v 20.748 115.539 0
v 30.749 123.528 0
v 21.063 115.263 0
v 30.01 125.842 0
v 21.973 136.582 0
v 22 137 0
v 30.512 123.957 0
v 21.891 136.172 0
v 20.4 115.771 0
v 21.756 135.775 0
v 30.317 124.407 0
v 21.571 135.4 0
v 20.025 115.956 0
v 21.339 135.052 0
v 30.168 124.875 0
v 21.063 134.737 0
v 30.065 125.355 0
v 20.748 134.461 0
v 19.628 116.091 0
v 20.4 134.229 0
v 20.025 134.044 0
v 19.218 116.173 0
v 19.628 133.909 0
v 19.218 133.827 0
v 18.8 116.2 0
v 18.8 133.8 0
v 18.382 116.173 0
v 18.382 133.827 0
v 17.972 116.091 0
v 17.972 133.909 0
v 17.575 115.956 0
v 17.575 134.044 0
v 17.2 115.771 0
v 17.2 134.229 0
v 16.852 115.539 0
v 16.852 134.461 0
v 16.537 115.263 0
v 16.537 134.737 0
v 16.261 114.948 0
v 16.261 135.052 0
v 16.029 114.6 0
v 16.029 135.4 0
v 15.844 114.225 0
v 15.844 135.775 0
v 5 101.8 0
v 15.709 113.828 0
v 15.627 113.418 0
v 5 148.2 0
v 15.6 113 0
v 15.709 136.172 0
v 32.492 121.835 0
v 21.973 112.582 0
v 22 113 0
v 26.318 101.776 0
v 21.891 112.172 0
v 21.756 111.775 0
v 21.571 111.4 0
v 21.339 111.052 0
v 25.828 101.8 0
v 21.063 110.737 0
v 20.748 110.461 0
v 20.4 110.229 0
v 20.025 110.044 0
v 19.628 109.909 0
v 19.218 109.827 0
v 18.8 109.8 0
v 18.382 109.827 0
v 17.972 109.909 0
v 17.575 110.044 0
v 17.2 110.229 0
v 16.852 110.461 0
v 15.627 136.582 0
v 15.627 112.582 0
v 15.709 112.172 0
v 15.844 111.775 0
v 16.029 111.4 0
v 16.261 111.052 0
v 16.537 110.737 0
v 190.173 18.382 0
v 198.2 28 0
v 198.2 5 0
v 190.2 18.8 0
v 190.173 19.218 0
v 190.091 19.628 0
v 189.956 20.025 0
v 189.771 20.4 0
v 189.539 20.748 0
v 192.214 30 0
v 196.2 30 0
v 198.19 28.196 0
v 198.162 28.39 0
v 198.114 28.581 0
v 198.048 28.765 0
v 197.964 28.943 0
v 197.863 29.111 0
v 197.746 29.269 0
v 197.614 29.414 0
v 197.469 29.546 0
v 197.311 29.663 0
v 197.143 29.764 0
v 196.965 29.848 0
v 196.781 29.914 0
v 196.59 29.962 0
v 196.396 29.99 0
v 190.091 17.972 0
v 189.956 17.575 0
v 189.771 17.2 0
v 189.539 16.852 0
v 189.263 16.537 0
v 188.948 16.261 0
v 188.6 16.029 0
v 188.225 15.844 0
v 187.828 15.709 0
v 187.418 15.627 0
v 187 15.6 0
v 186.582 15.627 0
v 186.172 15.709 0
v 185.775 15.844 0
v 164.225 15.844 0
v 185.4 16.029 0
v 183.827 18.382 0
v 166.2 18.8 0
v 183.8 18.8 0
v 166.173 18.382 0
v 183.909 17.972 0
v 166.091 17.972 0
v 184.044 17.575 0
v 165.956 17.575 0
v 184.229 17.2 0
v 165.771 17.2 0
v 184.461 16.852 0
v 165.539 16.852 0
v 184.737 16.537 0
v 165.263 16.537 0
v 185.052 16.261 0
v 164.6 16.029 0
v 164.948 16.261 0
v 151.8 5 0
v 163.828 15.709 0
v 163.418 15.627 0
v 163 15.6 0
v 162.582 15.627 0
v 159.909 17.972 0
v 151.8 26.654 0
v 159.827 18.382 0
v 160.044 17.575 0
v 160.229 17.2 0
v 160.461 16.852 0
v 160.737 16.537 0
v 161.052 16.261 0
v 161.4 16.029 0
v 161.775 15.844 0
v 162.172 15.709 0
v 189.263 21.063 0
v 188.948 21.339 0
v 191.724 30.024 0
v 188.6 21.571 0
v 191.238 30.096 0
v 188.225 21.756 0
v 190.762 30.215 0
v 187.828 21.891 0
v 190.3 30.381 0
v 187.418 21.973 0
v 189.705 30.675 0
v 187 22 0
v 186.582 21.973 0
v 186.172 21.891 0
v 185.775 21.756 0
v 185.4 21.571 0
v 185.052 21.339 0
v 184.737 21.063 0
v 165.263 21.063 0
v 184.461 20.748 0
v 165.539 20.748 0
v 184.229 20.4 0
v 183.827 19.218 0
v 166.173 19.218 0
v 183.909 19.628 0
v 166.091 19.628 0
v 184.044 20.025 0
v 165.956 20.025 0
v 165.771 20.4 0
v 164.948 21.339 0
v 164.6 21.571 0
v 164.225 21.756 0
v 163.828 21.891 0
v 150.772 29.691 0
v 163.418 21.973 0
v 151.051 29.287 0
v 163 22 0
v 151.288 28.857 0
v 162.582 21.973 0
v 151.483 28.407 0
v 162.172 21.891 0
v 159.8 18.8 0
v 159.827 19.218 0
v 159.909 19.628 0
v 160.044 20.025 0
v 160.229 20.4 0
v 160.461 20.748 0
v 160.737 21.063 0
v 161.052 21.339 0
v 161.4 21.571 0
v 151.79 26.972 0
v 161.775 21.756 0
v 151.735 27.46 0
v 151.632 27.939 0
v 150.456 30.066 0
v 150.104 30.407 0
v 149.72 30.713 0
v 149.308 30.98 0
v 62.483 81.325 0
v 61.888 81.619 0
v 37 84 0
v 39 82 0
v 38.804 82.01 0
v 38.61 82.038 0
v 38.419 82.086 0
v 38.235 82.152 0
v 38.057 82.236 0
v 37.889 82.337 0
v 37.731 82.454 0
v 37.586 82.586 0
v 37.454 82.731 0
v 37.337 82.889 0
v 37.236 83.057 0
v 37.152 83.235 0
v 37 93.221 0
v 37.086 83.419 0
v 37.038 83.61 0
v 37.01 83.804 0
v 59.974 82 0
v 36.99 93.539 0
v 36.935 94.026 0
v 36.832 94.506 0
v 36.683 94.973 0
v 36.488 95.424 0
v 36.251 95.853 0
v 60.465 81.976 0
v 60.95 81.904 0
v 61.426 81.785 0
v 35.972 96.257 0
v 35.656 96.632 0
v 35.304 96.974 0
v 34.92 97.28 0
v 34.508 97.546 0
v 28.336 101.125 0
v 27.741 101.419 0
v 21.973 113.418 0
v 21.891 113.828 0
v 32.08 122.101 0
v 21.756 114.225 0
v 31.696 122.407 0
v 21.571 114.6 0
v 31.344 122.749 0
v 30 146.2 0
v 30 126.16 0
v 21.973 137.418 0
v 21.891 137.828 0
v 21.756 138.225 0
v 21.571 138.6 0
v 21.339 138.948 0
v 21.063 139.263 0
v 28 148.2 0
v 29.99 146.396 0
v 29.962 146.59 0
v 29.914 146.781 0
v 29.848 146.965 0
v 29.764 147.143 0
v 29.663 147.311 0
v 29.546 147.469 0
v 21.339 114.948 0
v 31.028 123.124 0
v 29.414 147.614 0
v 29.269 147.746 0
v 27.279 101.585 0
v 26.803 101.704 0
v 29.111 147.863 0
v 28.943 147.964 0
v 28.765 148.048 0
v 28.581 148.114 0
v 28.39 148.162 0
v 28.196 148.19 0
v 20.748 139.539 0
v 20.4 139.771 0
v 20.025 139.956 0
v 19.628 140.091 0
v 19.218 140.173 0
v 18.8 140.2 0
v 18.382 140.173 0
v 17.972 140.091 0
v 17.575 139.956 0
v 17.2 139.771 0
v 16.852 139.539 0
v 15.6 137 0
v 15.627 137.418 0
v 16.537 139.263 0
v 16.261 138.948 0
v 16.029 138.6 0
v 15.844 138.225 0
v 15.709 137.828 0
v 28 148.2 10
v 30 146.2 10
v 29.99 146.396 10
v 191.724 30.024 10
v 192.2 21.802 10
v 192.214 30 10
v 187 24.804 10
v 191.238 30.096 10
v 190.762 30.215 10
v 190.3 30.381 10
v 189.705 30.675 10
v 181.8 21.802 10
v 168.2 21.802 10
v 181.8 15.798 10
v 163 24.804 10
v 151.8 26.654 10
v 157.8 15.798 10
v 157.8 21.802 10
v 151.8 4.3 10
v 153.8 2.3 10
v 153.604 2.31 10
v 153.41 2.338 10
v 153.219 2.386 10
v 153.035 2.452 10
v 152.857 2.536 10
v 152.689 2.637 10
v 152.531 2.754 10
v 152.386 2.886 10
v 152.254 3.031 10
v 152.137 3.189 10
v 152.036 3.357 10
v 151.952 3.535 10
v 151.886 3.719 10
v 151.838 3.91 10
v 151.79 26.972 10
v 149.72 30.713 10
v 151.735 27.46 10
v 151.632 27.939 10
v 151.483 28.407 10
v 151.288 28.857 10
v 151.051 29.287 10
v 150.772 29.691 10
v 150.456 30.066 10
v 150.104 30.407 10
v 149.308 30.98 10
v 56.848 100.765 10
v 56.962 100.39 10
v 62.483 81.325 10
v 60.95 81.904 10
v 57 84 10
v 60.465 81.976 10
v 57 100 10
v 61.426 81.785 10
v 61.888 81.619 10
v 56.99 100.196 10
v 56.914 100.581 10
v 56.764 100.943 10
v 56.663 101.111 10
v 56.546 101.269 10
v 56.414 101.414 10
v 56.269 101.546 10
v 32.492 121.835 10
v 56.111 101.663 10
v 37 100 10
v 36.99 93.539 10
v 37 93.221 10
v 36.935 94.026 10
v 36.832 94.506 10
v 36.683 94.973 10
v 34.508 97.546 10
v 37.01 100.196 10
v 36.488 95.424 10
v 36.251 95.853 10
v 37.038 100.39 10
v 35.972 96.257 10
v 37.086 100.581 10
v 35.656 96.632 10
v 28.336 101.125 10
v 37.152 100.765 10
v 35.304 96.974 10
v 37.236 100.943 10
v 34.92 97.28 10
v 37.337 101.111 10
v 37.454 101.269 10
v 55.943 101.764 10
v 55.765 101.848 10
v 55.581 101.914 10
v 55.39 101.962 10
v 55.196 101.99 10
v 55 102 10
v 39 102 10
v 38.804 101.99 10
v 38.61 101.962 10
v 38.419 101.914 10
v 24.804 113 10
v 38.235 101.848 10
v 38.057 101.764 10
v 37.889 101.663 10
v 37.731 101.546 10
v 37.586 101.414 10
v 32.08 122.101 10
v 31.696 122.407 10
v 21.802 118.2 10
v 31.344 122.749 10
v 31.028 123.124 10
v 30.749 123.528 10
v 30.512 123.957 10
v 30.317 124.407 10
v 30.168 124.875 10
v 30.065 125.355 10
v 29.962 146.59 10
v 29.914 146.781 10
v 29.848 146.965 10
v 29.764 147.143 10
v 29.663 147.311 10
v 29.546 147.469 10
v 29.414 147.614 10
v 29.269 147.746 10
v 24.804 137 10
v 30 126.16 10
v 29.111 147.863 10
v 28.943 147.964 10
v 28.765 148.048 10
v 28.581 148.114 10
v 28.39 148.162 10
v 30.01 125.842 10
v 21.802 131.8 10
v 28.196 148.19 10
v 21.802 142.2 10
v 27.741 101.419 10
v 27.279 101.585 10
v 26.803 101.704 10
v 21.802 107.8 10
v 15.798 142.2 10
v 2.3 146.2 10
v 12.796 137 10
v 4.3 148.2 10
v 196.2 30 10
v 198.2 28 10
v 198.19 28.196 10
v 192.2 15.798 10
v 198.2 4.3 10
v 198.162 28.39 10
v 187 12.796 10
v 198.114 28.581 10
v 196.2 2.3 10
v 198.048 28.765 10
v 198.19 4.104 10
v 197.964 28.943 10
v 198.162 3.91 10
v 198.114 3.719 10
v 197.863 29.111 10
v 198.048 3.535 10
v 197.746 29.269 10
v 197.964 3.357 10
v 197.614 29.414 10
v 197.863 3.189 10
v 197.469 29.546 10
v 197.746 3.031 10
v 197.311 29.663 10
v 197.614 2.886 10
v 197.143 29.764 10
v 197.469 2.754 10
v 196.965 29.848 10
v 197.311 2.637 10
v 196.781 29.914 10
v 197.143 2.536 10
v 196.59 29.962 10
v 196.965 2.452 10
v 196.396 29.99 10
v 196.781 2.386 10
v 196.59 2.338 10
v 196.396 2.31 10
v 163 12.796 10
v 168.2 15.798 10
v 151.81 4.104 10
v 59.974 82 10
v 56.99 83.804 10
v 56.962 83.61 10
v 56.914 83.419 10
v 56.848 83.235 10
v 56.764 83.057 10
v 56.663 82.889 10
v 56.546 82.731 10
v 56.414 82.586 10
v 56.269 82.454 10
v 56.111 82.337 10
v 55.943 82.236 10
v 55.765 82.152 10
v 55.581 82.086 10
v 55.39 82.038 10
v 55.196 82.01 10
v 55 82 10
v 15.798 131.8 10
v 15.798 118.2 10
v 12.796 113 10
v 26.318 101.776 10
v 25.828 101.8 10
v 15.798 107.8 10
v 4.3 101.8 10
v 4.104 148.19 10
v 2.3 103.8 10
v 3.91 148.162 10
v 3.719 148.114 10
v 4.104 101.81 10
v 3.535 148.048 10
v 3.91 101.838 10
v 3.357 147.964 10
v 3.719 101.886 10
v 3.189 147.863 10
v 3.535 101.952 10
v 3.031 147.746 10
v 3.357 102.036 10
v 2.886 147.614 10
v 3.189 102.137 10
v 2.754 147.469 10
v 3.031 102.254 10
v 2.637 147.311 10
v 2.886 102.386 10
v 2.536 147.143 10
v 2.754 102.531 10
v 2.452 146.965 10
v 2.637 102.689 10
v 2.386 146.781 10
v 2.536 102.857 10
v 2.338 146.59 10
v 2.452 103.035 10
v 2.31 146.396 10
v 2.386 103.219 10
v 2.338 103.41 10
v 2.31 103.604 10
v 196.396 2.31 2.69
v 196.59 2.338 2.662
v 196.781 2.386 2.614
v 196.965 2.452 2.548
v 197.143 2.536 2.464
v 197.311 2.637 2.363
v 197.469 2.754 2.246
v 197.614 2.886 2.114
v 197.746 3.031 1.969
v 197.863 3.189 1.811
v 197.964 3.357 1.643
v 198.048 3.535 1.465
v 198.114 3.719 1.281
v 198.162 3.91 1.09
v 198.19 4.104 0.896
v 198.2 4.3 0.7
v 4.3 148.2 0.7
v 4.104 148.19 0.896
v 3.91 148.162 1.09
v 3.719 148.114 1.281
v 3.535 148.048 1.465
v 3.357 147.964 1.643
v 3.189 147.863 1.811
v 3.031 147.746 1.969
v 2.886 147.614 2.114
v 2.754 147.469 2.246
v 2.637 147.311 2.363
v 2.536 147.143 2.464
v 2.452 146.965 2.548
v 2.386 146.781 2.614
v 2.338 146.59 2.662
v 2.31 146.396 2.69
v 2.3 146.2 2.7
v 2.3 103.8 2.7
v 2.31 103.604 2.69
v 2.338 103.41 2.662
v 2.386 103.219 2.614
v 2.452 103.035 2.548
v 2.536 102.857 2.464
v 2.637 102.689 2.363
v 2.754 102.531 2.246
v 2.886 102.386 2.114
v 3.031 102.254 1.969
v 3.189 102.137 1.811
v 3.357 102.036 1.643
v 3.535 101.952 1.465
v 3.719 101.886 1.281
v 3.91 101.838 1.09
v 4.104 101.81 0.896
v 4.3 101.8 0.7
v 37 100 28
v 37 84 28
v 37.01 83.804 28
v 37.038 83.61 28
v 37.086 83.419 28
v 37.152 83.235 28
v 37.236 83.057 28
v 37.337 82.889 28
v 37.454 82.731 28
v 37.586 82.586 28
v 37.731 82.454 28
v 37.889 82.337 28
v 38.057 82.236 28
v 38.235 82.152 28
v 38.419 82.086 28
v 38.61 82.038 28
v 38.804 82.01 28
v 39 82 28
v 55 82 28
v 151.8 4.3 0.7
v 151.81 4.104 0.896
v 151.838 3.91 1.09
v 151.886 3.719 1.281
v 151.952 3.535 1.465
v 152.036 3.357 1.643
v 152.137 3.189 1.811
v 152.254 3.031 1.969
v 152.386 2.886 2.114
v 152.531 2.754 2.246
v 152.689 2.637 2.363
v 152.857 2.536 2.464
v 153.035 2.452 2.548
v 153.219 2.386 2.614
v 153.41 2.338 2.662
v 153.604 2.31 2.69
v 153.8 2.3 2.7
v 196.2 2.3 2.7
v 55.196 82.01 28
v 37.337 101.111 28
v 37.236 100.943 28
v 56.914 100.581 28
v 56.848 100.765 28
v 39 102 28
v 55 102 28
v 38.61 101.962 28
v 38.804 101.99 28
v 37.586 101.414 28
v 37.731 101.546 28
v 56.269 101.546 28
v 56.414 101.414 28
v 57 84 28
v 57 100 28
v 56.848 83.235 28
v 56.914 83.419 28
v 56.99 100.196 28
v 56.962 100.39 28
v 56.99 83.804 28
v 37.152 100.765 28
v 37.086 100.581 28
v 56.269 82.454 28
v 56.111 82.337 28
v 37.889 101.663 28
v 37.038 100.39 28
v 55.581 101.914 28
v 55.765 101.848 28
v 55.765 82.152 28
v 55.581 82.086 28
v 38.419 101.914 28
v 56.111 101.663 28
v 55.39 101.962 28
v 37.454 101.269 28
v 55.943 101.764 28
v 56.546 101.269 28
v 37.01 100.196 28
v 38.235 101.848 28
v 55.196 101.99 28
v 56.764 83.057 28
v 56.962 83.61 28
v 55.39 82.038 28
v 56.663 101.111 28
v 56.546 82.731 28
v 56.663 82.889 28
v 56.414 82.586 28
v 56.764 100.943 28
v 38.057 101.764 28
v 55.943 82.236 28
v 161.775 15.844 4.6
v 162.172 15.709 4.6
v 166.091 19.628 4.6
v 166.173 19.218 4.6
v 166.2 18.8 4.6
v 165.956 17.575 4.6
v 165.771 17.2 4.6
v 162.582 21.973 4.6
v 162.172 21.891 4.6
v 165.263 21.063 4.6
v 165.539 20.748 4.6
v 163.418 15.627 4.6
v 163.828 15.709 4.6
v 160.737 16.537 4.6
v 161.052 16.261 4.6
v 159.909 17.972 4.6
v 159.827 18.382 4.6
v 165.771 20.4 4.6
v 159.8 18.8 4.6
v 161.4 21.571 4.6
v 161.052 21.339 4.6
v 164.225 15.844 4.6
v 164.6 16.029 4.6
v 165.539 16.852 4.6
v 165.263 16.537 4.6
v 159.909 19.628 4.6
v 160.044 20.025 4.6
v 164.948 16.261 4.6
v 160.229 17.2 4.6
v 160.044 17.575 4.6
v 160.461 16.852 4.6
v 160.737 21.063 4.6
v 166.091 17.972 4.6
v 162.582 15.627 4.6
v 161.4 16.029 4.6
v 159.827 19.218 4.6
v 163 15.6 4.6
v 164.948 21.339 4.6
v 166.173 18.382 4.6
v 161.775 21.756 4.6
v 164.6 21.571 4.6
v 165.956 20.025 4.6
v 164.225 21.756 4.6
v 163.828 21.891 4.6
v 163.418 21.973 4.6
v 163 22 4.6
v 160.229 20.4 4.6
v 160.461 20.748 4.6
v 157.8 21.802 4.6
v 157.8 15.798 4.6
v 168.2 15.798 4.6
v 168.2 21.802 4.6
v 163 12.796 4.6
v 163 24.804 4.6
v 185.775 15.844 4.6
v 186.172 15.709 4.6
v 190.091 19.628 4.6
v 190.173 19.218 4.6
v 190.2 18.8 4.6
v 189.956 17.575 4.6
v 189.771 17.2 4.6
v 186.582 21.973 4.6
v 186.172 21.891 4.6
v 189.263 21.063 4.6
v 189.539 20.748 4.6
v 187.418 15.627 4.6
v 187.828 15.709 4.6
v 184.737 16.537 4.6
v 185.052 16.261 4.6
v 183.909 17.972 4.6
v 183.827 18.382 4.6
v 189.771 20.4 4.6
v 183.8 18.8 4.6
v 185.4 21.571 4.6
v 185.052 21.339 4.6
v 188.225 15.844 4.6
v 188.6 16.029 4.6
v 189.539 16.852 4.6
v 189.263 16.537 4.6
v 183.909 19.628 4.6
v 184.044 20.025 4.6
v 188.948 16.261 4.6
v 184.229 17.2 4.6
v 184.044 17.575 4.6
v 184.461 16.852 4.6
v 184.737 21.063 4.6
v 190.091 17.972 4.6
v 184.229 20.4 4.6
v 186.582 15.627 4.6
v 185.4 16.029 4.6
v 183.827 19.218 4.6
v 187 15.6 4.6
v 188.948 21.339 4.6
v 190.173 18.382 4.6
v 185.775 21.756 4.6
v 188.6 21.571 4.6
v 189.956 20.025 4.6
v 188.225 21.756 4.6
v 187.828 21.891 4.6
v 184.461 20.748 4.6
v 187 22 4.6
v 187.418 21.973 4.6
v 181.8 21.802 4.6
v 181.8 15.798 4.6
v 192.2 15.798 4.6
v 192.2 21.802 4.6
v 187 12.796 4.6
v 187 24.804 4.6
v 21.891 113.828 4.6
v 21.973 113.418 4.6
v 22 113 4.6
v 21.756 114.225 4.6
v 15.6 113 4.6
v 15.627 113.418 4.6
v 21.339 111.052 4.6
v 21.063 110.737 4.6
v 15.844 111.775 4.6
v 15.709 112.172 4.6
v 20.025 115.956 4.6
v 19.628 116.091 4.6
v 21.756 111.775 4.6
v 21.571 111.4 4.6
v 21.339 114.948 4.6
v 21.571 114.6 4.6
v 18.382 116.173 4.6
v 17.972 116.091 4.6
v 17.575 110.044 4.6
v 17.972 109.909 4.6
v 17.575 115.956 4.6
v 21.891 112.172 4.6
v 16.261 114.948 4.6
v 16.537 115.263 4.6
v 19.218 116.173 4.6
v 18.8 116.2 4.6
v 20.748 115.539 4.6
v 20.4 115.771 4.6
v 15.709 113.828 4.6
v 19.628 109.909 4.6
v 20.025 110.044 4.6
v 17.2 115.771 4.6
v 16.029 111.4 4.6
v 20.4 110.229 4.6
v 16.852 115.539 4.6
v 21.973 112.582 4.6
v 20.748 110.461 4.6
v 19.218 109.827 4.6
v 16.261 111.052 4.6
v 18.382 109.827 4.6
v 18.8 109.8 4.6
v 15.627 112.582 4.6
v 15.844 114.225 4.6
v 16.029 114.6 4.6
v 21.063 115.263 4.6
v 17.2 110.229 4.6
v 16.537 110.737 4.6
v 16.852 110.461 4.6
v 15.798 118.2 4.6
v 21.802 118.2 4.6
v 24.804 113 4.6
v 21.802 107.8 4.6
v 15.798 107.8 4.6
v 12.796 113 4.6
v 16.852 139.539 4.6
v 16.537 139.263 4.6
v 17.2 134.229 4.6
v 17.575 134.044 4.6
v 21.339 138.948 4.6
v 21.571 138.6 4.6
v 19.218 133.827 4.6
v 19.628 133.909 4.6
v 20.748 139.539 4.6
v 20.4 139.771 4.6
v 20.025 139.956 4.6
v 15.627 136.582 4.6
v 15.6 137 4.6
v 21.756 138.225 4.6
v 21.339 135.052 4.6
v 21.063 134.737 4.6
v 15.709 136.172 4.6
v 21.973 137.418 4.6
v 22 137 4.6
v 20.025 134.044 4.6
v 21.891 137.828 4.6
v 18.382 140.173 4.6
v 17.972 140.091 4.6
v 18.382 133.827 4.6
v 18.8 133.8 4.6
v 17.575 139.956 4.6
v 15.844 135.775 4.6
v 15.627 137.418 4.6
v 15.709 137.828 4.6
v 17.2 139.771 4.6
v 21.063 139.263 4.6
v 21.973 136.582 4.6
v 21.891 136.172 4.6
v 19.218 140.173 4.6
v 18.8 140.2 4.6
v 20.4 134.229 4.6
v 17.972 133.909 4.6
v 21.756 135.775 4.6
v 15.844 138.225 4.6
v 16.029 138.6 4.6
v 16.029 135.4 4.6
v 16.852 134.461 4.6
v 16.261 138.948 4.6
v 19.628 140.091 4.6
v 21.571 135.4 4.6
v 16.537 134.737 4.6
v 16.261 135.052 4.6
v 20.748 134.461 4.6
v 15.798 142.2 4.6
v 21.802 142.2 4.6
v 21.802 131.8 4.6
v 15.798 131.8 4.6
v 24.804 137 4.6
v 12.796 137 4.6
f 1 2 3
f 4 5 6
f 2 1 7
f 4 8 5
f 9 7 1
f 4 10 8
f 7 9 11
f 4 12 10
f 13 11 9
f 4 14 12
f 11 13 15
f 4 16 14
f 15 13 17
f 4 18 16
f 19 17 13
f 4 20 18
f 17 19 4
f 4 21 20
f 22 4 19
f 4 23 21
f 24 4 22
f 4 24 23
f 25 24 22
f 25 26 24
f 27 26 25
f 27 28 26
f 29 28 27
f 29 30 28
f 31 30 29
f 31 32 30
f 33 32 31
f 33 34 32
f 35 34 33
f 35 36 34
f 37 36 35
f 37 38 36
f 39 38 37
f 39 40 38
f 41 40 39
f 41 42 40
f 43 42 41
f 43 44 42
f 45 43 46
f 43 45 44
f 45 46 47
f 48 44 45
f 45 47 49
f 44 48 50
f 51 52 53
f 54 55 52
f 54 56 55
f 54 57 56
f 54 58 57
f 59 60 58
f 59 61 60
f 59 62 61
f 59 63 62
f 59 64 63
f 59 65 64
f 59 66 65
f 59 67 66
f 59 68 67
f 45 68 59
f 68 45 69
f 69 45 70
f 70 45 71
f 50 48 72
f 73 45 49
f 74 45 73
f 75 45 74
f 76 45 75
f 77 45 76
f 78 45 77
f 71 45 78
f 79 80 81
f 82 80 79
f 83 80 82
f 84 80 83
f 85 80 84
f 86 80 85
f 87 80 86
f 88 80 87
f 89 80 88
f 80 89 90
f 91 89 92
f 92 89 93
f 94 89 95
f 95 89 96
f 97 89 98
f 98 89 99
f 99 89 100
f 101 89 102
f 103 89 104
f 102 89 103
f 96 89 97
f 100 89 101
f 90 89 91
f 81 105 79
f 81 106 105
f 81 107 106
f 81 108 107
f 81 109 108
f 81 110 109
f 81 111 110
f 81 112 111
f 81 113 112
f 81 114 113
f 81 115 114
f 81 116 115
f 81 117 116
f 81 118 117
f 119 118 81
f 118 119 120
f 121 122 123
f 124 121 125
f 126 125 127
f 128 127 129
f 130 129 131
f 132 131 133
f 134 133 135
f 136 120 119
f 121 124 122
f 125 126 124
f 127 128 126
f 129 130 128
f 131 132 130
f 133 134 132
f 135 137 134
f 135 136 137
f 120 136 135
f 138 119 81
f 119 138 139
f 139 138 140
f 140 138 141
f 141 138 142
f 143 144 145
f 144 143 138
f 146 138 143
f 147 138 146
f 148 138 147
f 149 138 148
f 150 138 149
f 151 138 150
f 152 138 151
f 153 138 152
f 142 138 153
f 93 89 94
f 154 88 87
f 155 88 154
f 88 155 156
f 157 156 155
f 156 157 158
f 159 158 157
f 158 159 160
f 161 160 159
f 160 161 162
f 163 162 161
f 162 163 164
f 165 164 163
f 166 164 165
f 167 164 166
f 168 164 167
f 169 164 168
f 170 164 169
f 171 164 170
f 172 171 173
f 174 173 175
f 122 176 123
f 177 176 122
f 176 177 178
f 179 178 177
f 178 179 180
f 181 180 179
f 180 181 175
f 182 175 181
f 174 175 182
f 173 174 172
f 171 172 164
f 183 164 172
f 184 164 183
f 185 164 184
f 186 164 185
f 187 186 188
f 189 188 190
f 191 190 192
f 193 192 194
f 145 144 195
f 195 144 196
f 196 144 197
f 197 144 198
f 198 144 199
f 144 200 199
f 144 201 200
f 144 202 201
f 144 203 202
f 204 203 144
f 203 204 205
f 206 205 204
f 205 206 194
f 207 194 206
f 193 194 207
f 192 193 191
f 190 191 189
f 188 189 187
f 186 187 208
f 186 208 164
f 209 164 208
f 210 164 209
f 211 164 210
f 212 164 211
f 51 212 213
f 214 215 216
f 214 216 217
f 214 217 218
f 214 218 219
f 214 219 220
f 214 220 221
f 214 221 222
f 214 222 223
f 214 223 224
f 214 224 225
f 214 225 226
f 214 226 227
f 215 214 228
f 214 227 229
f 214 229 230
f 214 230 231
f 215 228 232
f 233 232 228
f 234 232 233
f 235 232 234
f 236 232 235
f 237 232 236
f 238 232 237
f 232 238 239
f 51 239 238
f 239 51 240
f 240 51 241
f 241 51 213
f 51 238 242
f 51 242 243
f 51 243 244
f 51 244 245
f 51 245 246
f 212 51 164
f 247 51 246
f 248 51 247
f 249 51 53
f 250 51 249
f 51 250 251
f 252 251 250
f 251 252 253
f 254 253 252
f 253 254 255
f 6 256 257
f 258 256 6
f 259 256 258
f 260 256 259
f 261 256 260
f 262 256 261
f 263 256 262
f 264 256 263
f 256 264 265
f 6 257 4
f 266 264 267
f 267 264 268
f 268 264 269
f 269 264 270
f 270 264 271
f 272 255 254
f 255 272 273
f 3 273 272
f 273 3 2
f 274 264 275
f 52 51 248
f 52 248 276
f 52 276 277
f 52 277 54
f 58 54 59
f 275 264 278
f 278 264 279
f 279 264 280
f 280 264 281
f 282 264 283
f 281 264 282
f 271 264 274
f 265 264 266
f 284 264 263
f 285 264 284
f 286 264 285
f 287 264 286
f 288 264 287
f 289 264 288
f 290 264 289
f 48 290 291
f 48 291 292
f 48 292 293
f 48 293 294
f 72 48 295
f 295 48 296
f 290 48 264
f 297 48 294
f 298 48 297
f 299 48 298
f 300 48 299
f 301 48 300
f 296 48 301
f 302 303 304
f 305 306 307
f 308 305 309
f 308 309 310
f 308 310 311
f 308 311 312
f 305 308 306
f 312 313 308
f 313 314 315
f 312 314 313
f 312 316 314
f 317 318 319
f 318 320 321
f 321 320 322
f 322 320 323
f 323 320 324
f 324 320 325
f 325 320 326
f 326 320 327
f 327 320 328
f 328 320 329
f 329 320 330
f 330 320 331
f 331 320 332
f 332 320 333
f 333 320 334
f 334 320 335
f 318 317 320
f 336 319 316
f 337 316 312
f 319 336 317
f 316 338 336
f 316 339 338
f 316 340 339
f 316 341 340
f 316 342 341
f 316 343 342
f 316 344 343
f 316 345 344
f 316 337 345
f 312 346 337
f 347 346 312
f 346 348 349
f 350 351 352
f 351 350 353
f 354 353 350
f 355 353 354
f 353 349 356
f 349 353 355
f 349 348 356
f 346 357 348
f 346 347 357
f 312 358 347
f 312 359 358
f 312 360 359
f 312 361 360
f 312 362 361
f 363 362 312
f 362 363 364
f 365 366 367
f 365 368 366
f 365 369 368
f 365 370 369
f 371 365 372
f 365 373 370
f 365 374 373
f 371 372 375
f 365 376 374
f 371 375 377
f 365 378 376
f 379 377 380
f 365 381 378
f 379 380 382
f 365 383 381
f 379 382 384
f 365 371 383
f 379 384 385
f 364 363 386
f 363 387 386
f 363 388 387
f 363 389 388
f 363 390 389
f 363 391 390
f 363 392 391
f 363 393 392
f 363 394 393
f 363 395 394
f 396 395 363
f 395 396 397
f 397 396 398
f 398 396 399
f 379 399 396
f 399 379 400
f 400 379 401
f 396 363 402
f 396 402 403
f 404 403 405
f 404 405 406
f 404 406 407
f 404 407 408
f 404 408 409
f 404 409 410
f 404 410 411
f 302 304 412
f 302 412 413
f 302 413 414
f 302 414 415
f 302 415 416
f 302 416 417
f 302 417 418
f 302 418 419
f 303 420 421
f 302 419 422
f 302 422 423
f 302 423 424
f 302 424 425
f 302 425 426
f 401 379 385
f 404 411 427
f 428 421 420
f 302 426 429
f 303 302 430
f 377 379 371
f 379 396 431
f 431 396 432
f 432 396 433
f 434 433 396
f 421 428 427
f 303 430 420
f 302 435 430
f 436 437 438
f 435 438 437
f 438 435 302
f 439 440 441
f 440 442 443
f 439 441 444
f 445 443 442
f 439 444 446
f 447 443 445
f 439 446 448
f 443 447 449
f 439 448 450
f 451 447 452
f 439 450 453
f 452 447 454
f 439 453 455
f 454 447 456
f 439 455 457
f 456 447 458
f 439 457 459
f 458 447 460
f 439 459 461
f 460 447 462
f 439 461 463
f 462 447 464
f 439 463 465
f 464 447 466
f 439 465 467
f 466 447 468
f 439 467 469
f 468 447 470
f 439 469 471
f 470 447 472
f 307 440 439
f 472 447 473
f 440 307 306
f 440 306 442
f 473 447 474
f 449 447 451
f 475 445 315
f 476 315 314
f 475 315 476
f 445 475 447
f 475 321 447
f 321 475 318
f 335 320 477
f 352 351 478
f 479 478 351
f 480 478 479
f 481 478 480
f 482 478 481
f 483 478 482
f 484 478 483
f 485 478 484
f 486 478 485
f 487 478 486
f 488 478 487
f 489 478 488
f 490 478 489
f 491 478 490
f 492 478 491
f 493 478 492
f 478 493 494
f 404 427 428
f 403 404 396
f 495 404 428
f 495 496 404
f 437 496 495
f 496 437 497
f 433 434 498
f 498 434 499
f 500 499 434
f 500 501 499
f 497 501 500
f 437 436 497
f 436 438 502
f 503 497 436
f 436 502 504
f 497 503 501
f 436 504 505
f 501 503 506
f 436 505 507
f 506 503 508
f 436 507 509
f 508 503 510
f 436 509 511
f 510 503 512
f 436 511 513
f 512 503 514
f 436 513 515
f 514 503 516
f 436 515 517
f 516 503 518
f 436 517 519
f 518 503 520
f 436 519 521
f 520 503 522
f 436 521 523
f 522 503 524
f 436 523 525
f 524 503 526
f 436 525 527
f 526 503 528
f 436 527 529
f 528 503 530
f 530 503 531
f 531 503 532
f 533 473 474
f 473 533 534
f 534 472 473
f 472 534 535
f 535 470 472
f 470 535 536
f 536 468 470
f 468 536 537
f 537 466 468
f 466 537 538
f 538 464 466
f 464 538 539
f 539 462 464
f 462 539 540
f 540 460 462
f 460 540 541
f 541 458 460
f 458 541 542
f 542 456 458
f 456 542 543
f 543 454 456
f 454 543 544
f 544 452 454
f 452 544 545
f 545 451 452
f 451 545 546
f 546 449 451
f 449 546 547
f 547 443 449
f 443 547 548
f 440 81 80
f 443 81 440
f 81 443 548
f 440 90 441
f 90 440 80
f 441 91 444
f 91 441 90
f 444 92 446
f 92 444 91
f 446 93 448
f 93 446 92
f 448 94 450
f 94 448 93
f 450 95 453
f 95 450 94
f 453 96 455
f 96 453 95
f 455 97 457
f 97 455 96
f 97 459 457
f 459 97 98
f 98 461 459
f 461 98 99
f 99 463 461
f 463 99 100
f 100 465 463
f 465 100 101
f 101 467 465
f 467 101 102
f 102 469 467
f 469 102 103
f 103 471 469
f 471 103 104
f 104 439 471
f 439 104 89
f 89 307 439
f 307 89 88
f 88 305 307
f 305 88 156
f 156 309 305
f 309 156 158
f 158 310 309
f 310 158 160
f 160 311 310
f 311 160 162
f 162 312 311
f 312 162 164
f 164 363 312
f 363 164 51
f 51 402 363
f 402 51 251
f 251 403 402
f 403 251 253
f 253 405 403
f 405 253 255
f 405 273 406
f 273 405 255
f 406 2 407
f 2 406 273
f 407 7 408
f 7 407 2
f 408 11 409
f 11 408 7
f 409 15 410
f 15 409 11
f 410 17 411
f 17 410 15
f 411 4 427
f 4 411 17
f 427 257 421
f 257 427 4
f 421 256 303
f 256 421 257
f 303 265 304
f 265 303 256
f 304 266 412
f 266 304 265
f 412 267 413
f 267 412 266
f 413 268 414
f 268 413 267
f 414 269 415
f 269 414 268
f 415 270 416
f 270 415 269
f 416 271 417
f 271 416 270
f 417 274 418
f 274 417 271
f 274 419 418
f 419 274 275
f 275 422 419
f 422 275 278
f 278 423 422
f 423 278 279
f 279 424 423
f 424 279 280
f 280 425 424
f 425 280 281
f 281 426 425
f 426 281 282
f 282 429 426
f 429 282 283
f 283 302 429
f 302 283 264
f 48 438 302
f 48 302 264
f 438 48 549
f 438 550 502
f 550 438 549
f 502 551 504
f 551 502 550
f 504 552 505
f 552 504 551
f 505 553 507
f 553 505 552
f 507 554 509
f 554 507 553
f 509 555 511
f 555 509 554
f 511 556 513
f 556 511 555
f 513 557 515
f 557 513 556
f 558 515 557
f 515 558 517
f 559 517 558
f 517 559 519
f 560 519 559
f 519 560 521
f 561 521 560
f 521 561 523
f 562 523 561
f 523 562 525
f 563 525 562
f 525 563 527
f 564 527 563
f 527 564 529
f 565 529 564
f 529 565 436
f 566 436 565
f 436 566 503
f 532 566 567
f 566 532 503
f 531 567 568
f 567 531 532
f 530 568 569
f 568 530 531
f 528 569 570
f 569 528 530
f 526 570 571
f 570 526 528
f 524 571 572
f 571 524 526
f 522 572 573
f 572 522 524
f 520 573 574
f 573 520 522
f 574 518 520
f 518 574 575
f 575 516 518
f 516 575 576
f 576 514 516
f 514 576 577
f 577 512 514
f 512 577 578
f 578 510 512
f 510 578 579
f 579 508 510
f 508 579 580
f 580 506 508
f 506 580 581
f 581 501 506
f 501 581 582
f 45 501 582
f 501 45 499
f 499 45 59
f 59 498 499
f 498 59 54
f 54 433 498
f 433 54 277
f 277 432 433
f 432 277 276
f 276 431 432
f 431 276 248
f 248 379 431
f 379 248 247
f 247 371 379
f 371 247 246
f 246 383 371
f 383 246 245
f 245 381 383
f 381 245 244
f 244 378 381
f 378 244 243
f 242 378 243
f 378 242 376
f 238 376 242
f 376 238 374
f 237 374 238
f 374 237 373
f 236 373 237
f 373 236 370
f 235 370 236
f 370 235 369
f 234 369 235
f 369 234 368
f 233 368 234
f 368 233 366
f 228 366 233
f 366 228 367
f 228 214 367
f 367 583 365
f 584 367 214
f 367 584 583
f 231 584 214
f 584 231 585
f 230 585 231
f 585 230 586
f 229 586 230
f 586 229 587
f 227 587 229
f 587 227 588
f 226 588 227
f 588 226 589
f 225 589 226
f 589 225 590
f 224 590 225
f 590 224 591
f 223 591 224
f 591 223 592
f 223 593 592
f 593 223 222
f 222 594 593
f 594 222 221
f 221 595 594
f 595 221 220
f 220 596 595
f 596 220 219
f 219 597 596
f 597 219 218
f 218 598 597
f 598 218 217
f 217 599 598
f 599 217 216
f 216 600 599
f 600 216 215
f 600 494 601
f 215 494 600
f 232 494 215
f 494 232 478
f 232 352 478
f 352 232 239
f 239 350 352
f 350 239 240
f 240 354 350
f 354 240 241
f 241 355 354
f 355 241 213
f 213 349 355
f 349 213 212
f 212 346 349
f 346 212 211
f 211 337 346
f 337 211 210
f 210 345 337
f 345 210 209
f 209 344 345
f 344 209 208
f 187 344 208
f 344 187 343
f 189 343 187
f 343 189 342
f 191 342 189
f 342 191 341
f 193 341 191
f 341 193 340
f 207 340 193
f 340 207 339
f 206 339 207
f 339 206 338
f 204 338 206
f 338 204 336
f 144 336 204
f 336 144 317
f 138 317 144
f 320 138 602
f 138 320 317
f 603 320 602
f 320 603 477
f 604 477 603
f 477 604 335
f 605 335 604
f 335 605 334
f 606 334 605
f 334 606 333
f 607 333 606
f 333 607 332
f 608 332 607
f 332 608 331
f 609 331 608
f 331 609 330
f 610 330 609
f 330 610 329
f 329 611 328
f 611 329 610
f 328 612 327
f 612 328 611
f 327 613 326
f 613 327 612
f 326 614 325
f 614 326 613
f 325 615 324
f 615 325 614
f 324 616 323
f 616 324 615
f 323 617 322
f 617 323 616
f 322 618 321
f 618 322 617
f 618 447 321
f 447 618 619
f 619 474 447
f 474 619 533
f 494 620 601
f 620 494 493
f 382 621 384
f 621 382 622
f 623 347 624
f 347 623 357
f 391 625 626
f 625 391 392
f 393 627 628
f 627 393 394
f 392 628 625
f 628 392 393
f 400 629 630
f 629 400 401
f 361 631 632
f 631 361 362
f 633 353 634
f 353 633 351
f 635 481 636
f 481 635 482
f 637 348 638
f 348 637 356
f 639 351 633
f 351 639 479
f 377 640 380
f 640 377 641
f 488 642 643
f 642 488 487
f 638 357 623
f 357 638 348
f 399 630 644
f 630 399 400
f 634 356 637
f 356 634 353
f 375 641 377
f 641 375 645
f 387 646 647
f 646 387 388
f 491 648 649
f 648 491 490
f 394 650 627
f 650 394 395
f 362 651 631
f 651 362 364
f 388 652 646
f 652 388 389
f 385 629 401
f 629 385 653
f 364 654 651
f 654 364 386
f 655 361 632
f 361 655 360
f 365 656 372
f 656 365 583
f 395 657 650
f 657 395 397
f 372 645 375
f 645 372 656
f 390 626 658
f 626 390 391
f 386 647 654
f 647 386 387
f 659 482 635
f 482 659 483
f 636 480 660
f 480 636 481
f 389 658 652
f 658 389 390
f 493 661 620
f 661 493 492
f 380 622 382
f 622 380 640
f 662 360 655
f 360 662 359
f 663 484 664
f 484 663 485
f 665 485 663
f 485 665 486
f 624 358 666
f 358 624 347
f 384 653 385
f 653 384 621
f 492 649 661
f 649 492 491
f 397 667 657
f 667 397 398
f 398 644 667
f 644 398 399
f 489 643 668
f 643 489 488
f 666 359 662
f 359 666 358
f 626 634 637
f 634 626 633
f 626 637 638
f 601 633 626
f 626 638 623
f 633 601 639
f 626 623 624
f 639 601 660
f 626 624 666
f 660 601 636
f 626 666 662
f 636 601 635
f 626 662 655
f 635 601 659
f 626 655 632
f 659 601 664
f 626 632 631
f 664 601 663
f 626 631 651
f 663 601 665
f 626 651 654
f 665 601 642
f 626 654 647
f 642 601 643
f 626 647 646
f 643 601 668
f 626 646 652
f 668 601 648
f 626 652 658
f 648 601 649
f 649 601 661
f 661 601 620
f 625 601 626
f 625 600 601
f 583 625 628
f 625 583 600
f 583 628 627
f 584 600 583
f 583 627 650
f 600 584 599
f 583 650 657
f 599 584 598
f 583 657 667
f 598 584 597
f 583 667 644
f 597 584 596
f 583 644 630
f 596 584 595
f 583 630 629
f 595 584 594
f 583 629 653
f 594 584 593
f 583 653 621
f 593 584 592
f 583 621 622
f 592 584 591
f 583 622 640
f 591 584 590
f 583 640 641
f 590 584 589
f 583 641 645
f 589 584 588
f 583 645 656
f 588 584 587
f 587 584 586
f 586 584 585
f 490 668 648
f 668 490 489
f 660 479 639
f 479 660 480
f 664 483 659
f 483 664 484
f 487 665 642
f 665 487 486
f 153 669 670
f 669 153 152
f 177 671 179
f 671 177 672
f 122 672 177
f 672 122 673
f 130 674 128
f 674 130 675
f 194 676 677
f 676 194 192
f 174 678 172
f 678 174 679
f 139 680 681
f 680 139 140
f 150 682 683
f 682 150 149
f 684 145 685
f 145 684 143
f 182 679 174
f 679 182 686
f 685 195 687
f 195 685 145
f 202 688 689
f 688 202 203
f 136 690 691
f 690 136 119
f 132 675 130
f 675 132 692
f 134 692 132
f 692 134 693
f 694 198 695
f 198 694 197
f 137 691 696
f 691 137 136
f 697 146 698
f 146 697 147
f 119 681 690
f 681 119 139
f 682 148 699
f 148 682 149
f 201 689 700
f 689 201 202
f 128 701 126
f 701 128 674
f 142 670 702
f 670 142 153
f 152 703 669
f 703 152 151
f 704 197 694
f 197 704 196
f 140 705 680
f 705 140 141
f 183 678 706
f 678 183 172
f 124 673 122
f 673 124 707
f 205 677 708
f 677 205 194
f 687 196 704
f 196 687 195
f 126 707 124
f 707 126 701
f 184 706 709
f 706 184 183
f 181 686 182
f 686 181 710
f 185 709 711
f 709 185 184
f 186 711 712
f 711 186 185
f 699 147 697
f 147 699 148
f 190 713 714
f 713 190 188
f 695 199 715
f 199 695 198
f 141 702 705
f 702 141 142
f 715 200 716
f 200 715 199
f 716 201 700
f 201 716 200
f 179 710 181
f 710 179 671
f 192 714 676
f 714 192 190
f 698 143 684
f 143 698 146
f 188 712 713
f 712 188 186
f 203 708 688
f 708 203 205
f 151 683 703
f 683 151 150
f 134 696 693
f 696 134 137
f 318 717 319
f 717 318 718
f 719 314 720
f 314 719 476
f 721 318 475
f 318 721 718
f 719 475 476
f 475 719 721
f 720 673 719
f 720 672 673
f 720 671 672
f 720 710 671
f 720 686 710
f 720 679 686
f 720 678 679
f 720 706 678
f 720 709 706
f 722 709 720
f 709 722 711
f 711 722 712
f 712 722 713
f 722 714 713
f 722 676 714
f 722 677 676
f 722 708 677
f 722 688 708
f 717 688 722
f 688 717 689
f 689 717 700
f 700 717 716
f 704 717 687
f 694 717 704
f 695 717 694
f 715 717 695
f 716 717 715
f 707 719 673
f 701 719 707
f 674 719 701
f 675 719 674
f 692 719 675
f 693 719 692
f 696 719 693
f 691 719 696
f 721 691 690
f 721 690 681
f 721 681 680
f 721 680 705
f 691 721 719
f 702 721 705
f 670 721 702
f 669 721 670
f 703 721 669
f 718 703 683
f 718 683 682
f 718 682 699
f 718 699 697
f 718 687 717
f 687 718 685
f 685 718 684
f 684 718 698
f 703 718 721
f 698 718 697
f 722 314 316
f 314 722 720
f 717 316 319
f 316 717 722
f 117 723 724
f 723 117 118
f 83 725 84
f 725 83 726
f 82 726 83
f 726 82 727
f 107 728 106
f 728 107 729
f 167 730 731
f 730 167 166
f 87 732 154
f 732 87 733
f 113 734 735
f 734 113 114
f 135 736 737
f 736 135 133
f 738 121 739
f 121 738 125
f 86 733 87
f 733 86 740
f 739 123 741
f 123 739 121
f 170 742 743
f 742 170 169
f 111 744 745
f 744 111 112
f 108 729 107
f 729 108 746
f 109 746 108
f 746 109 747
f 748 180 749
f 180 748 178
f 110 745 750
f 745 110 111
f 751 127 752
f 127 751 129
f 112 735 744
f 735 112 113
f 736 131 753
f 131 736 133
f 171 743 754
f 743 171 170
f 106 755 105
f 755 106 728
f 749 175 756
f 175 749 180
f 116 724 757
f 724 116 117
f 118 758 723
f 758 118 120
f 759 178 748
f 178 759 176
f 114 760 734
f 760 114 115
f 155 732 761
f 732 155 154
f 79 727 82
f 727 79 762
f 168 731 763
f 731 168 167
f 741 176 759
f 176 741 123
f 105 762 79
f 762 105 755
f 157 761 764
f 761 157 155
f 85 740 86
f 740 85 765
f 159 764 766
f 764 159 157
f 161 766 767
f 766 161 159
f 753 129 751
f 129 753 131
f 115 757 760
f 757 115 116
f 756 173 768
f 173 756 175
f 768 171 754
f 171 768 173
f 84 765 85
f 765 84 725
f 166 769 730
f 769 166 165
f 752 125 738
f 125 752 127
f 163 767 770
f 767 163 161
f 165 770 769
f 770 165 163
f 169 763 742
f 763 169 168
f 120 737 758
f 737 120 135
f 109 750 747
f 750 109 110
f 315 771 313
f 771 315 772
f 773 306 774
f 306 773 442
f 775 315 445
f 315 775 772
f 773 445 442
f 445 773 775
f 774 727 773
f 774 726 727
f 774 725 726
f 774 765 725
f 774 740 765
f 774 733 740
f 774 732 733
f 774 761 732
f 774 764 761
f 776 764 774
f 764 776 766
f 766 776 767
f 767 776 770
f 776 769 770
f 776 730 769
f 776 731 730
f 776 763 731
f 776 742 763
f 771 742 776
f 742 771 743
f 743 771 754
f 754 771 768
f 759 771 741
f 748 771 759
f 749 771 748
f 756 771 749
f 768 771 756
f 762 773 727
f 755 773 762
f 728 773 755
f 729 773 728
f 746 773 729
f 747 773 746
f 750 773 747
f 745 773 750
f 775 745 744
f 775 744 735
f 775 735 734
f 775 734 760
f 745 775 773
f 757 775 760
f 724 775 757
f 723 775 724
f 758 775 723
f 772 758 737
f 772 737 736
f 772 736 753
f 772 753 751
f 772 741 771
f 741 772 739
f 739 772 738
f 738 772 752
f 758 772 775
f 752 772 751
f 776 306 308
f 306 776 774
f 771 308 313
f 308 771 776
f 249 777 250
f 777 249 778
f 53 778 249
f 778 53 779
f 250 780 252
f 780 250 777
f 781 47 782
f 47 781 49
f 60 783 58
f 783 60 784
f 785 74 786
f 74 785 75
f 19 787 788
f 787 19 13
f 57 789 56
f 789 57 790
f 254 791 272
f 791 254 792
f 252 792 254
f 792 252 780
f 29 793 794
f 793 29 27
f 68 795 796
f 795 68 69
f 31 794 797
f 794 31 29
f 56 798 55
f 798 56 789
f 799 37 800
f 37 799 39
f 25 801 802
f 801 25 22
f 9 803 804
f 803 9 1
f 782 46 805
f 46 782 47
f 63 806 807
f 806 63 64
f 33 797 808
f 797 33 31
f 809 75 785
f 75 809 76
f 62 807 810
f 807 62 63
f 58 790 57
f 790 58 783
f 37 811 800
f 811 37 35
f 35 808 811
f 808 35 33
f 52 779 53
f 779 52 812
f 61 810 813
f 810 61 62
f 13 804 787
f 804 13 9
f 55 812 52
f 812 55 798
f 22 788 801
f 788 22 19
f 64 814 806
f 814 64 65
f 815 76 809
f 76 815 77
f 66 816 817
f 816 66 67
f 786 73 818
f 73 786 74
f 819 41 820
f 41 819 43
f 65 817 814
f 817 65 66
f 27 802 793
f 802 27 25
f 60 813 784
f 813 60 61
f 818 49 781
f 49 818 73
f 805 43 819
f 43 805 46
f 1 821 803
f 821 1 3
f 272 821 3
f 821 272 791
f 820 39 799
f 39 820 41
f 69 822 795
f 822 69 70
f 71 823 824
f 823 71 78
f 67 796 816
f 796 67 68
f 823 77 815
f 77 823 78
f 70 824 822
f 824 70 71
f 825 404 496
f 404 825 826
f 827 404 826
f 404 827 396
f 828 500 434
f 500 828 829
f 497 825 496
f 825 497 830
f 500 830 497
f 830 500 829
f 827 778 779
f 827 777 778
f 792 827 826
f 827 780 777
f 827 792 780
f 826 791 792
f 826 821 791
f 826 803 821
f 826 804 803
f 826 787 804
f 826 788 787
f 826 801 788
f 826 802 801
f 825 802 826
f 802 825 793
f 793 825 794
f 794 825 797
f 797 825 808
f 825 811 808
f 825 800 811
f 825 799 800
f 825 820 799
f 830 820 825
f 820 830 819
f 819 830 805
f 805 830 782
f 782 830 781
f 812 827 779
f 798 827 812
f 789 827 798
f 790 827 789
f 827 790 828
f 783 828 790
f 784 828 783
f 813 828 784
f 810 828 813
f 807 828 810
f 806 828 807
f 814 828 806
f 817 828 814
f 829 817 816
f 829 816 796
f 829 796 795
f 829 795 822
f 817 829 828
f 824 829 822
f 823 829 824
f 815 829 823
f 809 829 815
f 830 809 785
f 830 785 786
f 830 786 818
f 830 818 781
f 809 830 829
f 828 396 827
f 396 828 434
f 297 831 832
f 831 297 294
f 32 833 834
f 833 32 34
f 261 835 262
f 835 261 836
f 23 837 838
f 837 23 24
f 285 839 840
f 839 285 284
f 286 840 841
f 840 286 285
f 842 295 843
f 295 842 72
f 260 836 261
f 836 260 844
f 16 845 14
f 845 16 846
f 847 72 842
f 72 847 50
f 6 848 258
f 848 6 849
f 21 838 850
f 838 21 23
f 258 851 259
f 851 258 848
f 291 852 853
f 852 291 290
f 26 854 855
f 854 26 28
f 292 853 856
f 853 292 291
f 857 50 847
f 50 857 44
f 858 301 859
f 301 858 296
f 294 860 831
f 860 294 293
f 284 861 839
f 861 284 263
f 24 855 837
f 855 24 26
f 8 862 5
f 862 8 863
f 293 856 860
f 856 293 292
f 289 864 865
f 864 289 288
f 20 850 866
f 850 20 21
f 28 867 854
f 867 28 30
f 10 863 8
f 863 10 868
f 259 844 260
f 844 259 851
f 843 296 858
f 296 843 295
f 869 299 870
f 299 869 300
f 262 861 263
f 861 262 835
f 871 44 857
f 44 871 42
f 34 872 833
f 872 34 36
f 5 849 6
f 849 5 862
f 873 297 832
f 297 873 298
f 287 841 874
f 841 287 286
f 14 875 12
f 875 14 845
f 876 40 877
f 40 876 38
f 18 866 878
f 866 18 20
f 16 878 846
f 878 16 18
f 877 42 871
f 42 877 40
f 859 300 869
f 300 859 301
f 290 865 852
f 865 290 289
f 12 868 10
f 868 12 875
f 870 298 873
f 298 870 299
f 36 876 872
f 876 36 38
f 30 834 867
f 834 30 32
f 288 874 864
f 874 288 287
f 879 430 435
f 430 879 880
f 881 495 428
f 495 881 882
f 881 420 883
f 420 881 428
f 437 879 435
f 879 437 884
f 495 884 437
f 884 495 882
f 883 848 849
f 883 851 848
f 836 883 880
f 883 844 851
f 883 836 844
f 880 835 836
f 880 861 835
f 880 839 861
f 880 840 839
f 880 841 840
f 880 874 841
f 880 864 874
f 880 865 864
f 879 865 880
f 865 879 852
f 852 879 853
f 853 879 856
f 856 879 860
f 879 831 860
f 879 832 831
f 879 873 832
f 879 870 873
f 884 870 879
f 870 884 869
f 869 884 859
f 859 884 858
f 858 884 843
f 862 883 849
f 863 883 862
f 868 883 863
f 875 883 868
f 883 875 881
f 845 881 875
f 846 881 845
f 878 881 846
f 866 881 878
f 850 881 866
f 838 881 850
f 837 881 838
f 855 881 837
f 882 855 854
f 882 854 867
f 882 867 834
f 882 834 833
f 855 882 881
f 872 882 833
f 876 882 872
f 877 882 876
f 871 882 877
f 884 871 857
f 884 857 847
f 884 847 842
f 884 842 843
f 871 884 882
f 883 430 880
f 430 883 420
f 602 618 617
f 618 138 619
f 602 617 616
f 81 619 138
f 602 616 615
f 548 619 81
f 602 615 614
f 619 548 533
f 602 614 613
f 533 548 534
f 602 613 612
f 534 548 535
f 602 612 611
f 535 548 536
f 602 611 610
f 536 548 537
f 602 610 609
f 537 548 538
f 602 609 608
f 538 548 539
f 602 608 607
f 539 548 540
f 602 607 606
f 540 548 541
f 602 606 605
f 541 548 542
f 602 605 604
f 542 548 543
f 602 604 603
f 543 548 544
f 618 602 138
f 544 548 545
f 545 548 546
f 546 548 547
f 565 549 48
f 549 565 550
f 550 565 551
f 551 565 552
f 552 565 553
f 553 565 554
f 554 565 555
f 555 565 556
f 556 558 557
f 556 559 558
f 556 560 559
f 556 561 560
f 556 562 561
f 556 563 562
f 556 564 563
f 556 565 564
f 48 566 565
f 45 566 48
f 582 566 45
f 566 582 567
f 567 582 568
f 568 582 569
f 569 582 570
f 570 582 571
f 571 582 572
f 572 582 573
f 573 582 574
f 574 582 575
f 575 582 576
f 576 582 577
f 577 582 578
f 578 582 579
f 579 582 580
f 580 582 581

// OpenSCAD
// file: ../../../../modules/steel_rack.scad
use <bolts.scad>;

bolt_edge_offset = 15;
bolt_positions = [
  bolt_edge_offset,
  bolt_edge_offset + 98,
  bolt_edge_offset + 98 + 24,
];

module bolt_and_nut(y, h) {
  nut_thickness = 5;
  translate([0, y, h / 2])
    m6_bolt_hole(h + 1, center = true);
  translate([0, y, h - nut_thickness / 2])
    rotate([0, 0, 90])
    m6_nut_trap(nut_thickness, center = true);
}

module long_bar(w, y, h) {
  difference() {
    translate([w / 2, y / 2, h / 2])
      cube([w, y, h], center = true);

    for (x = bolt_positions) {
      translate([x, 0, 0])
        bolt_and_nut(y / 2, h);
    }
  }
}

module short_bar(w, y, h) {
  difference() {
    translate([w / 2, y / 2, h / 2])
      cube([w, y, h], center = true);

    translate([bolt_positions[0], 0, 0])
      bolt_and_nut(y / 2, h);
  }
}

module fillet_profile(r, h) {
  linear_extrude(height = h, center = true)
    difference() {
      square([r, r]);
      circle(r = r, $fn = 64);
    }
}
// file: ../../../../modules/slide_rail_outer_bracket.scad
use <bolts.scad>
use <steel_rack.scad>

// スライドレール外側とL字アングルを接合するL字ブラケット。
// 設計の経緯と確定値は ledger/designs/steel-rack-500x400.md が正本。
//
// 座標系 (部品自身の datum):
//   X = 0 がこの部品側のL字アングル外側面。部品はアングル板厚の内側から始まる
//   Y = 0 がスライドレール外側面。+Y がラック外側
//   Z = 0 が部品底面 (レール下端と一致)
// front は screw_x = [37, 101.5]、rear は [79.5, 176] を自分の datum
// から渡す。 M6 が高さ 22.5±12 の対称配置のため部品は Z 反転対称になり、
// 左右のレールにも上下反転するだけで同じ2部品を使い回せる。

bracket_height = 45;
flange_t = 10; // 短辺 (X方向厚) の厚さ
// 長辺 (Y方向厚) の厚さ。旧断面は flange_t=10 を共用していたが、レール面を
// rail_offset 分外へ出すと M6 ナット挿入口が長辺と重なるため 2mm 削った
// (10→8、user決定)。ナット六角の内縁 (y=8.000) と長辺外面がツライチになる
arm_t = 8;
// レール接触面のラック外側オフセット。組付け実測でレール間隔が 385mm しか
// なくケース 412mm が入らないため、(412 - 385) / 2 + 0.5 = 14mm ずつ
// 各レールを外側へ移す (user指示)。M6 実穴は既に開いており位置を変えられない
rail_offset = 14;
inner_r = 4;
m6_z = [ 10.5, 34.5 ];
// クリアランス基準: 呼び寸法 + 0.4mm (実プリントの嵌合結果から拡大)
m6_pass_flat = 6.4; // M6ボルト通し六角の二面幅 (手前5mm)
m6_nut_flat = 10.4; // M6ナット窪み六角の二面幅 (奥5mm、ナット実測9.8 + 実効0.6)
m6_stage_depth = 5;
screw_z = 22.5;
m4_pass_flat = 4.4; // M4小トラスネジ通し六角の二面幅
m4_nut_flat = 7.4; // M4ナット窪み六角の二面幅 (ナット実測6.8 + 実効0.6)
m4_nut_depth = 2.8; // M4ナット窪みの深さ (user指定)
edge_margin = 8; // 穴の外縁から部品端までの余白 (自由な辺のみ)
angle_t = 2.2; // L字アングルの板厚

// 六角プリズム: 軸X・上下の辺が水平 (flat-up)。
// 天井を短い水平ブリッジにして垂れの改善を狙う
// (point-up だと天井面が水平から30°になり垂れた — 嵌合試験で確認済み)
module
hex_x_flat_up(flat_d, l)
{
    rotate([ 0, 90, 0 ]) rotate([ 0, 0, 90 ]) hex_hole(flat_d = flat_d, h = l);
}

// 六角プリズム: 軸Y・上下の辺が水平 (flat-up)。M6と同じくブリッジ天井
module
hex_y_flat_up(flat_d, l)
{
    rotate([ 90, 0, 0 ]) hex_hole(flat_d = flat_d, h = l);
}

module
slide_rail_outer_bracket(screw_x, name = "bracket")
{
    // flat-up配置では水平方向の穴半径は対角/2 (= 二面幅/(2*cos30))。
    // 8mm余白の契約はこの実半径に対して守る
    m6_nut_diag = m6_nut_flat / cos(30);
    m4_nut_diag = m4_nut_flat / cos(30);
    // M6中心: 実物のアングルには旧断面 (長辺厚10) の導出値
    // (厚10 + 内側R + 余白 + M6六角対角/2 = 28.0044) で既に穴が開いている。
    // 旧導出式から rail_offset を引くことで M6 実穴と部品外端の絶対位置を
    // 保ったまま、レール接触面 (y=0) だけをラック外側へ 14mm 出す
    m6_y = flange_t + inner_r + edge_margin + m6_nut_diag / 2 - rail_offset;
    short_len = m6_y + m6_nut_diag / 2 + edge_margin;
    // 長辺のX終端: 最奥のM4穴の最大断面 (ナット窪みの対角の半分) + 余白
    arm_end = max(screw_x) + m4_nut_diag / 2 + edge_margin;

    echo(str("CONTRACT ", name, ": height = ", bracket_height));
    echo(str("CONTRACT ", name, ": flange_t = ", flange_t));
    echo(str("CONTRACT ", name, ": arm_t = ", arm_t));
    echo(str("CONTRACT ", name, ": rail_offset = ", rail_offset));
    echo(str("CONTRACT ", name, ": inner_r = ", inner_r));
    echo(str("CONTRACT ", name, ": m6_z = ", m6_z));
    echo(str("CONTRACT ", name, ": m6_pass_flat = ", m6_pass_flat));
    echo(str("CONTRACT ", name, ": m6_nut_flat = ", m6_nut_flat));
    echo(str("CONTRACT ", name, ": screw_z = ", screw_z));
    echo(str("CONTRACT ", name, ": m4_pass_flat = ", m4_pass_flat));
    echo(str("CONTRACT ", name, ": m4_nut_flat = ", m4_nut_flat));
    echo(str("CONTRACT ", name, ": m4_nut_depth = ", m4_nut_depth));
    echo(str("CONTRACT ", name, ": edge_margin = ", edge_margin));
    echo(str("CONTRACT ", name, ": angle_t = ", angle_t));
    echo(str("CONTRACT ", name, ": screw_x = ", screw_x));
    echo(str("CONTRACT ",
             name,
             ": m6_y = ",
             m6_y,
             ", short_len = ",
             short_len,
             ", arm_end = ",
             arm_end));

    // 余白の契約 (自由な辺のみ。高さ45とM6のZはuser固定値なので対象外)。
    // M6ナット六角の内縁 (m6_y - 対角/2 = 8.000) は長辺外面 (y = arm_t) と
    // ツライチで、ナット挿入口が長辺に塞がれない (1e-9 は浮動小数の丸め猶予)
    assert(m6_y - m6_nut_diag / 2 >= arm_t - 1e-9,
           "M6 nut slot is blocked by the arm");
    assert(short_len - (m6_y + m6_nut_diag / 2) >= edge_margin,
           "M6 hole too close to the short-flange edge");
    assert(arm_end - (max(screw_x) + m4_nut_diag / 2) >= edge_margin,
           "M4 hole too close to the arm end");
    assert(min(screw_x) - m4_nut_diag / 2 >= angle_t + flange_t,
           "M4 hole overlaps the short flange");

    difference()
    {
        union()
        {
            // 短辺: アングル内側に当たる縦板 (M6で締結)
            translate([ angle_t, 0, 0 ])
                cube([ flange_t, short_len, bracket_height ]);

            // 長辺: レール外側面に当たる横板 (M4小トラスネジ+ナットで締結)
            translate([ angle_t, 0, 0 ])
                cube([ arm_end - angle_t, arm_t, bracket_height ]);

            // 内側コーナーのR4フィレット (応力集中の回避)
            translate([
                angle_t + flange_t + inner_r,
                arm_t + inner_r,
                bracket_height / 2
            ]) rotate([ 0, 0, 180 ]) fillet_profile(inner_r, bracket_height);
        }

        // M6の2段六角穴 (軸X・flat-up): 手前5mmが通し、奥5mmがナット窪み。
        // ナット窪みは +X へ延長した挿入回廊 (x=7.2..17): 短辺の背面から
        // fillet の掛かる区間を局所カットし、fillet 外端 (x=16.2) を 0.8mm
        // 超えて開放することで M6 ナットを +X 側から真っ直ぐ挿入できる
        // (fillet と挿入経路の干渉分を削るのは user 許容)。
        // 六角の下頂点 (y=8.000) は長辺外面とツライチで、正確な接触は
        // 退化した稜 (非多様体STL) を作るため、hull で 0.2mm 下へ掃引して
        // 長辺外面に浅い逃げ溝を彫る (ナットの嵌合には影響しない)
        slot_start = angle_t + flange_t - m6_stage_depth;
        slot_end = angle_t + flange_t + inner_r + 0.8;
        slot_relief = 0.2;
        for (z = m6_z) {
            translate([ angle_t + m6_stage_depth / 2 - 0.05, m6_y, z ])
                hex_x_flat_up(m6_pass_flat, m6_stage_depth + 0.1);
            translate([ (slot_start + slot_end) / 2, m6_y, z ]) hull()
            {
                hex_x_flat_up(m6_nut_flat, slot_end - slot_start);
                translate([ 0, -slot_relief, 0 ])
                    hex_x_flat_up(m6_nut_flat, slot_end - slot_start);
            }
        }

        // M4小トラスネジの穴 (軸Y・flat-up):
        // 通しは全厚を貫通し、L字の内側面 (y=8) から深さ2.8mmのナット窪み。
        // ネジはレール内側から刺さり
        // (トラス頭はスライダーと干渉しない実測済み)、
        // ナットが窪みの底で受けてレール板とブラケットを共締めする
        for (x = screw_x) {
            translate([ x, arm_t / 2, screw_z ])
                hex_y_flat_up(m4_pass_flat, arm_t + 0.2);
            translate([ x, arm_t - m4_nut_depth / 2 + 0.05, screw_z ])
                hex_y_flat_up(m4_nut_flat, m4_nut_depth + 0.1);
        }
    }
}
// file: ../../../../modules/bolts.scad
module nut_trap(d, h, center = true) {
  linear_extrude(height = h, center = center)
  circle(d = d / cos(30), $fn = 6);
}

module bolt_hole(d, h, center = true) {
  linear_extrude(height = h, center = center)
  circle(d = d, $fn = 64);
}

// Hex holes for self-tapping (nominal - 0.2mm)
module hex_hole(flat_d, h) {
  linear_extrude(height = h, center = true)
  circle(d = flat_d / cos(30), $fn = 6);
}

module m3_bolt_hexhole(h) {
  rotate([0, 0, 90]) hex_hole(flat_d = 2.8, h = h);
}

module m4_bolt_hexhole(h) {
  rotate([0, 0, 90]) hex_hole(flat_d = 3.8, h = h);
}

module m6_bolt_hexhole(h) {
  rotate([0, 0, 90]) hex_hole(flat_d = 5.8, h = h);
}

module m8_bolt_hexhole(h) {
  rotate([0, 0, 90]) hex_hole(flat_d = 7.8, h = h);
}

// M3
module m3_bolt_hole(h, center = false) { bolt_hole(d = 3.4, h = h, center = center); }
module m3_nut_trap(h, center = false) { nut_trap(d = 5.7, h = h, center = center); }

// M4
module m4_bolt_hole(h, center = false) { bolt_hole(d = 4.4, h = h, center = center); }
module m4_nut_trap(h, center = false) { nut_trap(d = 7.5, h = h, center = center); }

// M6
module m6_bolt_hole(h, center = false) { bolt_hole(d = 6.2, h = h, center = center); }
module m6_nut_trap(h, center = false) { nut_trap(d = 10.2, h = h, center = center); }

// M8
module m8_bolt_hole(h, center = false) { bolt_hole(d = 8.4, h = h, center = center); }
module m8_nut_trap(h, center = false) { nut_trap(d = 13.3, h = h, center = center); }
// main file
use <../../../../modules/shelf_frame.scad>

// ケース棚の筋交い。手前左・奥右用。土台の下面をビルドプレートへ置いた向き。
shelf_frame_flat_print() shelf_frame_brace();
